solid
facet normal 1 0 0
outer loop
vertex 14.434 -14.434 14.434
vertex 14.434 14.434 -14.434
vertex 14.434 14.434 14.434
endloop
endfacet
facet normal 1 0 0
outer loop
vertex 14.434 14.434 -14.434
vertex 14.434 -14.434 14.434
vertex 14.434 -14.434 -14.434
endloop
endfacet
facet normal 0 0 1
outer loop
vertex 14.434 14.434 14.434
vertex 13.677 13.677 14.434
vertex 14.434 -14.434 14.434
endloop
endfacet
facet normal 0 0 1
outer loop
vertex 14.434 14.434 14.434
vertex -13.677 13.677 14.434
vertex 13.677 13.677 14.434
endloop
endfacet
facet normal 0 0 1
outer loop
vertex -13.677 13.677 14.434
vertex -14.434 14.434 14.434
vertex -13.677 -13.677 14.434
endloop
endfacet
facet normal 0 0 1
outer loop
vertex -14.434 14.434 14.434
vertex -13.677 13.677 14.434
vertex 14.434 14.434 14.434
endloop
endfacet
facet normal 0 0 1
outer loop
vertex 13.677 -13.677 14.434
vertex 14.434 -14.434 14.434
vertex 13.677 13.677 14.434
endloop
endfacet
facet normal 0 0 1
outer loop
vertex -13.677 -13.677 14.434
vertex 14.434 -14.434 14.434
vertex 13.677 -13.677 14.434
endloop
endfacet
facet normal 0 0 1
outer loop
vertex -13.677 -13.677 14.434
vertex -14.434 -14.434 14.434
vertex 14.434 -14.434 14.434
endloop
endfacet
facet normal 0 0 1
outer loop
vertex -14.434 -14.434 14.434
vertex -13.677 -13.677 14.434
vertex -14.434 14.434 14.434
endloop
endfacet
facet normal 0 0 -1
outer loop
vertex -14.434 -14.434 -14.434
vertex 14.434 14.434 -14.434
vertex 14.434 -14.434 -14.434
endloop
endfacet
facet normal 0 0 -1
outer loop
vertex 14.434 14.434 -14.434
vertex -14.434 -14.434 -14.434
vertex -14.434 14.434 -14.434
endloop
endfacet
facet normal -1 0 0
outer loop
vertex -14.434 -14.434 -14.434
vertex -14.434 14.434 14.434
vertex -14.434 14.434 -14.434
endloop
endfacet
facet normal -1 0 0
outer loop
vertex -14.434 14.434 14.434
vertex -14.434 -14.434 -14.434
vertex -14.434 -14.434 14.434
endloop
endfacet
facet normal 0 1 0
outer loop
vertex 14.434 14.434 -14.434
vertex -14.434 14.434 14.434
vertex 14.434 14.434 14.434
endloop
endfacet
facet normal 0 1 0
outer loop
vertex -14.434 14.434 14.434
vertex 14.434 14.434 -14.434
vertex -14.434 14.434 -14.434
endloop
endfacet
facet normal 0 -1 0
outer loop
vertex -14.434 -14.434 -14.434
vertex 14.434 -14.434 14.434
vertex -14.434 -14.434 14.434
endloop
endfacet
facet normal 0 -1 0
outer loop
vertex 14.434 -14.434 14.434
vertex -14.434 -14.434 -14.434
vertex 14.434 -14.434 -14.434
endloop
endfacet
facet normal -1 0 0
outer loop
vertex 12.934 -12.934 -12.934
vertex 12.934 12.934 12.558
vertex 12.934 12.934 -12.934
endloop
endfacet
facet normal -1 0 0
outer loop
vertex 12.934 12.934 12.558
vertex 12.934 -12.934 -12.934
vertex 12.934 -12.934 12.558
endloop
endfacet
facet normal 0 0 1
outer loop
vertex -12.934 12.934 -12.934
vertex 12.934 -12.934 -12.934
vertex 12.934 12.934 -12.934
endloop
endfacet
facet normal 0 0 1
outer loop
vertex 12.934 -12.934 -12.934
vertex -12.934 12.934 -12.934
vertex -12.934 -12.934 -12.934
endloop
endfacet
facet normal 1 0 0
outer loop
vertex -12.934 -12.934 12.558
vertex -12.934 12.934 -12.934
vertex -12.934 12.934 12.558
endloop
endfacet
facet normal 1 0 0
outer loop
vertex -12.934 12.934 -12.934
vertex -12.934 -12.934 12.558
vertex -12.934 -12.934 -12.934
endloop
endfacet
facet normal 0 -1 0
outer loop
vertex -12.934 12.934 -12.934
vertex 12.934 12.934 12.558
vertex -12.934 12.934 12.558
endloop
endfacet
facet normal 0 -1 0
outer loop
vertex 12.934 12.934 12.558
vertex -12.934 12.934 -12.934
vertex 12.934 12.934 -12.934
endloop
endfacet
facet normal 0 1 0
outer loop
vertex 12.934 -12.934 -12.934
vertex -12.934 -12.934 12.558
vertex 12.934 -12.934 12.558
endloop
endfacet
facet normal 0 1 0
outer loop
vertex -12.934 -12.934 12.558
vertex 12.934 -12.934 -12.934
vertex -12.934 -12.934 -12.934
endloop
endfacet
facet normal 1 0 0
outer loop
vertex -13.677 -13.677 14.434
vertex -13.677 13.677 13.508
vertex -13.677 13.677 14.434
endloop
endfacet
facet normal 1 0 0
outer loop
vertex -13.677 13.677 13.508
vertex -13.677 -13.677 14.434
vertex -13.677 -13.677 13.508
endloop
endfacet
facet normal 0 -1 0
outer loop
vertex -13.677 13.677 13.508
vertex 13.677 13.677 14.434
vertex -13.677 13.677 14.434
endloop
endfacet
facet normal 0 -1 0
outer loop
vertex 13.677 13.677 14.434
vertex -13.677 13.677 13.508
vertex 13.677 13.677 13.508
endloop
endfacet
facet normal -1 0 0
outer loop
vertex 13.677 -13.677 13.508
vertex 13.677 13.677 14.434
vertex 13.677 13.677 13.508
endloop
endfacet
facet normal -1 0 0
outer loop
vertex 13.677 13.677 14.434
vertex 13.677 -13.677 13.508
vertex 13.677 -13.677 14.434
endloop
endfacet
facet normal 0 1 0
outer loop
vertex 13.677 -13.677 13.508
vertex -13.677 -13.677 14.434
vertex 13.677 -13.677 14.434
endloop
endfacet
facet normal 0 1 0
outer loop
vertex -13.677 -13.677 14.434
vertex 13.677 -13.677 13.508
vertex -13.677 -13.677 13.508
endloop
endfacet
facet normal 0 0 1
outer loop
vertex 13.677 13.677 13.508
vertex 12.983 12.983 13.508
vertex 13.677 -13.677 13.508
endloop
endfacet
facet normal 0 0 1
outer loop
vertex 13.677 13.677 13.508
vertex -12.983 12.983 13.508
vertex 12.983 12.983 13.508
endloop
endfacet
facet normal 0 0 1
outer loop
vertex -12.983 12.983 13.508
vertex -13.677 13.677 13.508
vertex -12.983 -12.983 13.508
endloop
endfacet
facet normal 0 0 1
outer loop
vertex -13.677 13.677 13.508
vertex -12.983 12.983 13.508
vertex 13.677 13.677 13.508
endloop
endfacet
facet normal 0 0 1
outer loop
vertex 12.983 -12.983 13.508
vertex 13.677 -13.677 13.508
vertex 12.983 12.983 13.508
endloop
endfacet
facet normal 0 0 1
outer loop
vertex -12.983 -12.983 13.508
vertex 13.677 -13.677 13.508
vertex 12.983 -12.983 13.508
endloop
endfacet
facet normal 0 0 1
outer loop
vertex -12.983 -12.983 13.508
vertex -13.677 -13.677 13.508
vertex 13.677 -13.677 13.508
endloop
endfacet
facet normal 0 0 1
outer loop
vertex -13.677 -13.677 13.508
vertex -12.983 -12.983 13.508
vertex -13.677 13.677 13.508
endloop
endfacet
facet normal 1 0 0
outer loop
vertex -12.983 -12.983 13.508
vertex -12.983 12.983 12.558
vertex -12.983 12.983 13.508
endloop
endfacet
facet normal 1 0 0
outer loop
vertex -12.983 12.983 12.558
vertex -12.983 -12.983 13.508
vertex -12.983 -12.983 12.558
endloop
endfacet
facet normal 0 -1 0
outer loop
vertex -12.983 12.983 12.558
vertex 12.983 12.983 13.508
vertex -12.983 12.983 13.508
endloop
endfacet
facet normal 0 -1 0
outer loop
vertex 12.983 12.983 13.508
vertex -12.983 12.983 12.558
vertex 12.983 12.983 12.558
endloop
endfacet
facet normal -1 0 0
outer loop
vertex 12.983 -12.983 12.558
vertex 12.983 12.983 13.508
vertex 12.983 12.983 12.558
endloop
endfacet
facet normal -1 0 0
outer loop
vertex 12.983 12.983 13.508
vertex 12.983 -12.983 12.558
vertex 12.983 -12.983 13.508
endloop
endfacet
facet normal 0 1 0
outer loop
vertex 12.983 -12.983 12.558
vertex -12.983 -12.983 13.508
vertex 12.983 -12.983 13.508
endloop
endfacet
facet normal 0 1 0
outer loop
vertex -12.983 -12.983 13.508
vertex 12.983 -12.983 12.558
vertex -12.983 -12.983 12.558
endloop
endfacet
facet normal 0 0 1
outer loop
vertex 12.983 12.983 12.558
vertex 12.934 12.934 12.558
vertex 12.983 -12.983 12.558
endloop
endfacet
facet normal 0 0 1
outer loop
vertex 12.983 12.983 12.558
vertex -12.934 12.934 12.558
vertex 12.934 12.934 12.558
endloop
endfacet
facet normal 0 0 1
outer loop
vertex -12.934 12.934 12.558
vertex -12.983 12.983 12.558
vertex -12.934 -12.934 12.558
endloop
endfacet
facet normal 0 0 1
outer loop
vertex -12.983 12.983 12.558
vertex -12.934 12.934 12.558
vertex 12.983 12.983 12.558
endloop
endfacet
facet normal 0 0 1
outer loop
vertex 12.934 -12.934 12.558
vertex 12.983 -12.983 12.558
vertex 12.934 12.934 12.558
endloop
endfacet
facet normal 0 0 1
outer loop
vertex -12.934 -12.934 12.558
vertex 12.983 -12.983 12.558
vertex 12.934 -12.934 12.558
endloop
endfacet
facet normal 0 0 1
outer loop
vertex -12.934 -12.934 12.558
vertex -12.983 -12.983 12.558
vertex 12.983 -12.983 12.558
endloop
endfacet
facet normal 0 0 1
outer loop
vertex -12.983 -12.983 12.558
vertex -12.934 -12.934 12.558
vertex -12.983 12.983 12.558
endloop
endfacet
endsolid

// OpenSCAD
arete = 28.868;
paroi = 1.5;
echelleReductionAjustementBouchon = 0.985;
r = 0.19; // résolution d'impression sur l'axe Z

//ico_creux();
//decoupe_bouchon();
corps_ouvert();
//bouchon();
//trou();

module corps_ouvert() {
    //rotate([180, 0, 0])
	difference() {
		cube_creux();
		decoupe_bouchon();
	}
}

module bouchon() {
	scale([echelleReductionAjustementBouchon, echelleReductionAjustementBouchon, 0.995])
	difference () {
        intersection() {
            cube_creux();
            decoupe_bouchon(echelleReductionAjustementBouchon);
        }
	}
}

module cube_creux() {
	difference() {
        cube(arete, center=true);
        cube(arete-2*paroi, center=true);
	}
}

module decoupe_bouchon(scale=1) {
	rotate([0,0,45]) translate([0,0,arete/2*0.87+5*r])
		cylinder(6*r, r=arete*0.67, $fn=4);
	rotate([0,0,45]) translate([0,0,arete/2*0.87])
		cylinder(6*r, r=(arete-paroi/2)*0.653, $fn=4);
}
